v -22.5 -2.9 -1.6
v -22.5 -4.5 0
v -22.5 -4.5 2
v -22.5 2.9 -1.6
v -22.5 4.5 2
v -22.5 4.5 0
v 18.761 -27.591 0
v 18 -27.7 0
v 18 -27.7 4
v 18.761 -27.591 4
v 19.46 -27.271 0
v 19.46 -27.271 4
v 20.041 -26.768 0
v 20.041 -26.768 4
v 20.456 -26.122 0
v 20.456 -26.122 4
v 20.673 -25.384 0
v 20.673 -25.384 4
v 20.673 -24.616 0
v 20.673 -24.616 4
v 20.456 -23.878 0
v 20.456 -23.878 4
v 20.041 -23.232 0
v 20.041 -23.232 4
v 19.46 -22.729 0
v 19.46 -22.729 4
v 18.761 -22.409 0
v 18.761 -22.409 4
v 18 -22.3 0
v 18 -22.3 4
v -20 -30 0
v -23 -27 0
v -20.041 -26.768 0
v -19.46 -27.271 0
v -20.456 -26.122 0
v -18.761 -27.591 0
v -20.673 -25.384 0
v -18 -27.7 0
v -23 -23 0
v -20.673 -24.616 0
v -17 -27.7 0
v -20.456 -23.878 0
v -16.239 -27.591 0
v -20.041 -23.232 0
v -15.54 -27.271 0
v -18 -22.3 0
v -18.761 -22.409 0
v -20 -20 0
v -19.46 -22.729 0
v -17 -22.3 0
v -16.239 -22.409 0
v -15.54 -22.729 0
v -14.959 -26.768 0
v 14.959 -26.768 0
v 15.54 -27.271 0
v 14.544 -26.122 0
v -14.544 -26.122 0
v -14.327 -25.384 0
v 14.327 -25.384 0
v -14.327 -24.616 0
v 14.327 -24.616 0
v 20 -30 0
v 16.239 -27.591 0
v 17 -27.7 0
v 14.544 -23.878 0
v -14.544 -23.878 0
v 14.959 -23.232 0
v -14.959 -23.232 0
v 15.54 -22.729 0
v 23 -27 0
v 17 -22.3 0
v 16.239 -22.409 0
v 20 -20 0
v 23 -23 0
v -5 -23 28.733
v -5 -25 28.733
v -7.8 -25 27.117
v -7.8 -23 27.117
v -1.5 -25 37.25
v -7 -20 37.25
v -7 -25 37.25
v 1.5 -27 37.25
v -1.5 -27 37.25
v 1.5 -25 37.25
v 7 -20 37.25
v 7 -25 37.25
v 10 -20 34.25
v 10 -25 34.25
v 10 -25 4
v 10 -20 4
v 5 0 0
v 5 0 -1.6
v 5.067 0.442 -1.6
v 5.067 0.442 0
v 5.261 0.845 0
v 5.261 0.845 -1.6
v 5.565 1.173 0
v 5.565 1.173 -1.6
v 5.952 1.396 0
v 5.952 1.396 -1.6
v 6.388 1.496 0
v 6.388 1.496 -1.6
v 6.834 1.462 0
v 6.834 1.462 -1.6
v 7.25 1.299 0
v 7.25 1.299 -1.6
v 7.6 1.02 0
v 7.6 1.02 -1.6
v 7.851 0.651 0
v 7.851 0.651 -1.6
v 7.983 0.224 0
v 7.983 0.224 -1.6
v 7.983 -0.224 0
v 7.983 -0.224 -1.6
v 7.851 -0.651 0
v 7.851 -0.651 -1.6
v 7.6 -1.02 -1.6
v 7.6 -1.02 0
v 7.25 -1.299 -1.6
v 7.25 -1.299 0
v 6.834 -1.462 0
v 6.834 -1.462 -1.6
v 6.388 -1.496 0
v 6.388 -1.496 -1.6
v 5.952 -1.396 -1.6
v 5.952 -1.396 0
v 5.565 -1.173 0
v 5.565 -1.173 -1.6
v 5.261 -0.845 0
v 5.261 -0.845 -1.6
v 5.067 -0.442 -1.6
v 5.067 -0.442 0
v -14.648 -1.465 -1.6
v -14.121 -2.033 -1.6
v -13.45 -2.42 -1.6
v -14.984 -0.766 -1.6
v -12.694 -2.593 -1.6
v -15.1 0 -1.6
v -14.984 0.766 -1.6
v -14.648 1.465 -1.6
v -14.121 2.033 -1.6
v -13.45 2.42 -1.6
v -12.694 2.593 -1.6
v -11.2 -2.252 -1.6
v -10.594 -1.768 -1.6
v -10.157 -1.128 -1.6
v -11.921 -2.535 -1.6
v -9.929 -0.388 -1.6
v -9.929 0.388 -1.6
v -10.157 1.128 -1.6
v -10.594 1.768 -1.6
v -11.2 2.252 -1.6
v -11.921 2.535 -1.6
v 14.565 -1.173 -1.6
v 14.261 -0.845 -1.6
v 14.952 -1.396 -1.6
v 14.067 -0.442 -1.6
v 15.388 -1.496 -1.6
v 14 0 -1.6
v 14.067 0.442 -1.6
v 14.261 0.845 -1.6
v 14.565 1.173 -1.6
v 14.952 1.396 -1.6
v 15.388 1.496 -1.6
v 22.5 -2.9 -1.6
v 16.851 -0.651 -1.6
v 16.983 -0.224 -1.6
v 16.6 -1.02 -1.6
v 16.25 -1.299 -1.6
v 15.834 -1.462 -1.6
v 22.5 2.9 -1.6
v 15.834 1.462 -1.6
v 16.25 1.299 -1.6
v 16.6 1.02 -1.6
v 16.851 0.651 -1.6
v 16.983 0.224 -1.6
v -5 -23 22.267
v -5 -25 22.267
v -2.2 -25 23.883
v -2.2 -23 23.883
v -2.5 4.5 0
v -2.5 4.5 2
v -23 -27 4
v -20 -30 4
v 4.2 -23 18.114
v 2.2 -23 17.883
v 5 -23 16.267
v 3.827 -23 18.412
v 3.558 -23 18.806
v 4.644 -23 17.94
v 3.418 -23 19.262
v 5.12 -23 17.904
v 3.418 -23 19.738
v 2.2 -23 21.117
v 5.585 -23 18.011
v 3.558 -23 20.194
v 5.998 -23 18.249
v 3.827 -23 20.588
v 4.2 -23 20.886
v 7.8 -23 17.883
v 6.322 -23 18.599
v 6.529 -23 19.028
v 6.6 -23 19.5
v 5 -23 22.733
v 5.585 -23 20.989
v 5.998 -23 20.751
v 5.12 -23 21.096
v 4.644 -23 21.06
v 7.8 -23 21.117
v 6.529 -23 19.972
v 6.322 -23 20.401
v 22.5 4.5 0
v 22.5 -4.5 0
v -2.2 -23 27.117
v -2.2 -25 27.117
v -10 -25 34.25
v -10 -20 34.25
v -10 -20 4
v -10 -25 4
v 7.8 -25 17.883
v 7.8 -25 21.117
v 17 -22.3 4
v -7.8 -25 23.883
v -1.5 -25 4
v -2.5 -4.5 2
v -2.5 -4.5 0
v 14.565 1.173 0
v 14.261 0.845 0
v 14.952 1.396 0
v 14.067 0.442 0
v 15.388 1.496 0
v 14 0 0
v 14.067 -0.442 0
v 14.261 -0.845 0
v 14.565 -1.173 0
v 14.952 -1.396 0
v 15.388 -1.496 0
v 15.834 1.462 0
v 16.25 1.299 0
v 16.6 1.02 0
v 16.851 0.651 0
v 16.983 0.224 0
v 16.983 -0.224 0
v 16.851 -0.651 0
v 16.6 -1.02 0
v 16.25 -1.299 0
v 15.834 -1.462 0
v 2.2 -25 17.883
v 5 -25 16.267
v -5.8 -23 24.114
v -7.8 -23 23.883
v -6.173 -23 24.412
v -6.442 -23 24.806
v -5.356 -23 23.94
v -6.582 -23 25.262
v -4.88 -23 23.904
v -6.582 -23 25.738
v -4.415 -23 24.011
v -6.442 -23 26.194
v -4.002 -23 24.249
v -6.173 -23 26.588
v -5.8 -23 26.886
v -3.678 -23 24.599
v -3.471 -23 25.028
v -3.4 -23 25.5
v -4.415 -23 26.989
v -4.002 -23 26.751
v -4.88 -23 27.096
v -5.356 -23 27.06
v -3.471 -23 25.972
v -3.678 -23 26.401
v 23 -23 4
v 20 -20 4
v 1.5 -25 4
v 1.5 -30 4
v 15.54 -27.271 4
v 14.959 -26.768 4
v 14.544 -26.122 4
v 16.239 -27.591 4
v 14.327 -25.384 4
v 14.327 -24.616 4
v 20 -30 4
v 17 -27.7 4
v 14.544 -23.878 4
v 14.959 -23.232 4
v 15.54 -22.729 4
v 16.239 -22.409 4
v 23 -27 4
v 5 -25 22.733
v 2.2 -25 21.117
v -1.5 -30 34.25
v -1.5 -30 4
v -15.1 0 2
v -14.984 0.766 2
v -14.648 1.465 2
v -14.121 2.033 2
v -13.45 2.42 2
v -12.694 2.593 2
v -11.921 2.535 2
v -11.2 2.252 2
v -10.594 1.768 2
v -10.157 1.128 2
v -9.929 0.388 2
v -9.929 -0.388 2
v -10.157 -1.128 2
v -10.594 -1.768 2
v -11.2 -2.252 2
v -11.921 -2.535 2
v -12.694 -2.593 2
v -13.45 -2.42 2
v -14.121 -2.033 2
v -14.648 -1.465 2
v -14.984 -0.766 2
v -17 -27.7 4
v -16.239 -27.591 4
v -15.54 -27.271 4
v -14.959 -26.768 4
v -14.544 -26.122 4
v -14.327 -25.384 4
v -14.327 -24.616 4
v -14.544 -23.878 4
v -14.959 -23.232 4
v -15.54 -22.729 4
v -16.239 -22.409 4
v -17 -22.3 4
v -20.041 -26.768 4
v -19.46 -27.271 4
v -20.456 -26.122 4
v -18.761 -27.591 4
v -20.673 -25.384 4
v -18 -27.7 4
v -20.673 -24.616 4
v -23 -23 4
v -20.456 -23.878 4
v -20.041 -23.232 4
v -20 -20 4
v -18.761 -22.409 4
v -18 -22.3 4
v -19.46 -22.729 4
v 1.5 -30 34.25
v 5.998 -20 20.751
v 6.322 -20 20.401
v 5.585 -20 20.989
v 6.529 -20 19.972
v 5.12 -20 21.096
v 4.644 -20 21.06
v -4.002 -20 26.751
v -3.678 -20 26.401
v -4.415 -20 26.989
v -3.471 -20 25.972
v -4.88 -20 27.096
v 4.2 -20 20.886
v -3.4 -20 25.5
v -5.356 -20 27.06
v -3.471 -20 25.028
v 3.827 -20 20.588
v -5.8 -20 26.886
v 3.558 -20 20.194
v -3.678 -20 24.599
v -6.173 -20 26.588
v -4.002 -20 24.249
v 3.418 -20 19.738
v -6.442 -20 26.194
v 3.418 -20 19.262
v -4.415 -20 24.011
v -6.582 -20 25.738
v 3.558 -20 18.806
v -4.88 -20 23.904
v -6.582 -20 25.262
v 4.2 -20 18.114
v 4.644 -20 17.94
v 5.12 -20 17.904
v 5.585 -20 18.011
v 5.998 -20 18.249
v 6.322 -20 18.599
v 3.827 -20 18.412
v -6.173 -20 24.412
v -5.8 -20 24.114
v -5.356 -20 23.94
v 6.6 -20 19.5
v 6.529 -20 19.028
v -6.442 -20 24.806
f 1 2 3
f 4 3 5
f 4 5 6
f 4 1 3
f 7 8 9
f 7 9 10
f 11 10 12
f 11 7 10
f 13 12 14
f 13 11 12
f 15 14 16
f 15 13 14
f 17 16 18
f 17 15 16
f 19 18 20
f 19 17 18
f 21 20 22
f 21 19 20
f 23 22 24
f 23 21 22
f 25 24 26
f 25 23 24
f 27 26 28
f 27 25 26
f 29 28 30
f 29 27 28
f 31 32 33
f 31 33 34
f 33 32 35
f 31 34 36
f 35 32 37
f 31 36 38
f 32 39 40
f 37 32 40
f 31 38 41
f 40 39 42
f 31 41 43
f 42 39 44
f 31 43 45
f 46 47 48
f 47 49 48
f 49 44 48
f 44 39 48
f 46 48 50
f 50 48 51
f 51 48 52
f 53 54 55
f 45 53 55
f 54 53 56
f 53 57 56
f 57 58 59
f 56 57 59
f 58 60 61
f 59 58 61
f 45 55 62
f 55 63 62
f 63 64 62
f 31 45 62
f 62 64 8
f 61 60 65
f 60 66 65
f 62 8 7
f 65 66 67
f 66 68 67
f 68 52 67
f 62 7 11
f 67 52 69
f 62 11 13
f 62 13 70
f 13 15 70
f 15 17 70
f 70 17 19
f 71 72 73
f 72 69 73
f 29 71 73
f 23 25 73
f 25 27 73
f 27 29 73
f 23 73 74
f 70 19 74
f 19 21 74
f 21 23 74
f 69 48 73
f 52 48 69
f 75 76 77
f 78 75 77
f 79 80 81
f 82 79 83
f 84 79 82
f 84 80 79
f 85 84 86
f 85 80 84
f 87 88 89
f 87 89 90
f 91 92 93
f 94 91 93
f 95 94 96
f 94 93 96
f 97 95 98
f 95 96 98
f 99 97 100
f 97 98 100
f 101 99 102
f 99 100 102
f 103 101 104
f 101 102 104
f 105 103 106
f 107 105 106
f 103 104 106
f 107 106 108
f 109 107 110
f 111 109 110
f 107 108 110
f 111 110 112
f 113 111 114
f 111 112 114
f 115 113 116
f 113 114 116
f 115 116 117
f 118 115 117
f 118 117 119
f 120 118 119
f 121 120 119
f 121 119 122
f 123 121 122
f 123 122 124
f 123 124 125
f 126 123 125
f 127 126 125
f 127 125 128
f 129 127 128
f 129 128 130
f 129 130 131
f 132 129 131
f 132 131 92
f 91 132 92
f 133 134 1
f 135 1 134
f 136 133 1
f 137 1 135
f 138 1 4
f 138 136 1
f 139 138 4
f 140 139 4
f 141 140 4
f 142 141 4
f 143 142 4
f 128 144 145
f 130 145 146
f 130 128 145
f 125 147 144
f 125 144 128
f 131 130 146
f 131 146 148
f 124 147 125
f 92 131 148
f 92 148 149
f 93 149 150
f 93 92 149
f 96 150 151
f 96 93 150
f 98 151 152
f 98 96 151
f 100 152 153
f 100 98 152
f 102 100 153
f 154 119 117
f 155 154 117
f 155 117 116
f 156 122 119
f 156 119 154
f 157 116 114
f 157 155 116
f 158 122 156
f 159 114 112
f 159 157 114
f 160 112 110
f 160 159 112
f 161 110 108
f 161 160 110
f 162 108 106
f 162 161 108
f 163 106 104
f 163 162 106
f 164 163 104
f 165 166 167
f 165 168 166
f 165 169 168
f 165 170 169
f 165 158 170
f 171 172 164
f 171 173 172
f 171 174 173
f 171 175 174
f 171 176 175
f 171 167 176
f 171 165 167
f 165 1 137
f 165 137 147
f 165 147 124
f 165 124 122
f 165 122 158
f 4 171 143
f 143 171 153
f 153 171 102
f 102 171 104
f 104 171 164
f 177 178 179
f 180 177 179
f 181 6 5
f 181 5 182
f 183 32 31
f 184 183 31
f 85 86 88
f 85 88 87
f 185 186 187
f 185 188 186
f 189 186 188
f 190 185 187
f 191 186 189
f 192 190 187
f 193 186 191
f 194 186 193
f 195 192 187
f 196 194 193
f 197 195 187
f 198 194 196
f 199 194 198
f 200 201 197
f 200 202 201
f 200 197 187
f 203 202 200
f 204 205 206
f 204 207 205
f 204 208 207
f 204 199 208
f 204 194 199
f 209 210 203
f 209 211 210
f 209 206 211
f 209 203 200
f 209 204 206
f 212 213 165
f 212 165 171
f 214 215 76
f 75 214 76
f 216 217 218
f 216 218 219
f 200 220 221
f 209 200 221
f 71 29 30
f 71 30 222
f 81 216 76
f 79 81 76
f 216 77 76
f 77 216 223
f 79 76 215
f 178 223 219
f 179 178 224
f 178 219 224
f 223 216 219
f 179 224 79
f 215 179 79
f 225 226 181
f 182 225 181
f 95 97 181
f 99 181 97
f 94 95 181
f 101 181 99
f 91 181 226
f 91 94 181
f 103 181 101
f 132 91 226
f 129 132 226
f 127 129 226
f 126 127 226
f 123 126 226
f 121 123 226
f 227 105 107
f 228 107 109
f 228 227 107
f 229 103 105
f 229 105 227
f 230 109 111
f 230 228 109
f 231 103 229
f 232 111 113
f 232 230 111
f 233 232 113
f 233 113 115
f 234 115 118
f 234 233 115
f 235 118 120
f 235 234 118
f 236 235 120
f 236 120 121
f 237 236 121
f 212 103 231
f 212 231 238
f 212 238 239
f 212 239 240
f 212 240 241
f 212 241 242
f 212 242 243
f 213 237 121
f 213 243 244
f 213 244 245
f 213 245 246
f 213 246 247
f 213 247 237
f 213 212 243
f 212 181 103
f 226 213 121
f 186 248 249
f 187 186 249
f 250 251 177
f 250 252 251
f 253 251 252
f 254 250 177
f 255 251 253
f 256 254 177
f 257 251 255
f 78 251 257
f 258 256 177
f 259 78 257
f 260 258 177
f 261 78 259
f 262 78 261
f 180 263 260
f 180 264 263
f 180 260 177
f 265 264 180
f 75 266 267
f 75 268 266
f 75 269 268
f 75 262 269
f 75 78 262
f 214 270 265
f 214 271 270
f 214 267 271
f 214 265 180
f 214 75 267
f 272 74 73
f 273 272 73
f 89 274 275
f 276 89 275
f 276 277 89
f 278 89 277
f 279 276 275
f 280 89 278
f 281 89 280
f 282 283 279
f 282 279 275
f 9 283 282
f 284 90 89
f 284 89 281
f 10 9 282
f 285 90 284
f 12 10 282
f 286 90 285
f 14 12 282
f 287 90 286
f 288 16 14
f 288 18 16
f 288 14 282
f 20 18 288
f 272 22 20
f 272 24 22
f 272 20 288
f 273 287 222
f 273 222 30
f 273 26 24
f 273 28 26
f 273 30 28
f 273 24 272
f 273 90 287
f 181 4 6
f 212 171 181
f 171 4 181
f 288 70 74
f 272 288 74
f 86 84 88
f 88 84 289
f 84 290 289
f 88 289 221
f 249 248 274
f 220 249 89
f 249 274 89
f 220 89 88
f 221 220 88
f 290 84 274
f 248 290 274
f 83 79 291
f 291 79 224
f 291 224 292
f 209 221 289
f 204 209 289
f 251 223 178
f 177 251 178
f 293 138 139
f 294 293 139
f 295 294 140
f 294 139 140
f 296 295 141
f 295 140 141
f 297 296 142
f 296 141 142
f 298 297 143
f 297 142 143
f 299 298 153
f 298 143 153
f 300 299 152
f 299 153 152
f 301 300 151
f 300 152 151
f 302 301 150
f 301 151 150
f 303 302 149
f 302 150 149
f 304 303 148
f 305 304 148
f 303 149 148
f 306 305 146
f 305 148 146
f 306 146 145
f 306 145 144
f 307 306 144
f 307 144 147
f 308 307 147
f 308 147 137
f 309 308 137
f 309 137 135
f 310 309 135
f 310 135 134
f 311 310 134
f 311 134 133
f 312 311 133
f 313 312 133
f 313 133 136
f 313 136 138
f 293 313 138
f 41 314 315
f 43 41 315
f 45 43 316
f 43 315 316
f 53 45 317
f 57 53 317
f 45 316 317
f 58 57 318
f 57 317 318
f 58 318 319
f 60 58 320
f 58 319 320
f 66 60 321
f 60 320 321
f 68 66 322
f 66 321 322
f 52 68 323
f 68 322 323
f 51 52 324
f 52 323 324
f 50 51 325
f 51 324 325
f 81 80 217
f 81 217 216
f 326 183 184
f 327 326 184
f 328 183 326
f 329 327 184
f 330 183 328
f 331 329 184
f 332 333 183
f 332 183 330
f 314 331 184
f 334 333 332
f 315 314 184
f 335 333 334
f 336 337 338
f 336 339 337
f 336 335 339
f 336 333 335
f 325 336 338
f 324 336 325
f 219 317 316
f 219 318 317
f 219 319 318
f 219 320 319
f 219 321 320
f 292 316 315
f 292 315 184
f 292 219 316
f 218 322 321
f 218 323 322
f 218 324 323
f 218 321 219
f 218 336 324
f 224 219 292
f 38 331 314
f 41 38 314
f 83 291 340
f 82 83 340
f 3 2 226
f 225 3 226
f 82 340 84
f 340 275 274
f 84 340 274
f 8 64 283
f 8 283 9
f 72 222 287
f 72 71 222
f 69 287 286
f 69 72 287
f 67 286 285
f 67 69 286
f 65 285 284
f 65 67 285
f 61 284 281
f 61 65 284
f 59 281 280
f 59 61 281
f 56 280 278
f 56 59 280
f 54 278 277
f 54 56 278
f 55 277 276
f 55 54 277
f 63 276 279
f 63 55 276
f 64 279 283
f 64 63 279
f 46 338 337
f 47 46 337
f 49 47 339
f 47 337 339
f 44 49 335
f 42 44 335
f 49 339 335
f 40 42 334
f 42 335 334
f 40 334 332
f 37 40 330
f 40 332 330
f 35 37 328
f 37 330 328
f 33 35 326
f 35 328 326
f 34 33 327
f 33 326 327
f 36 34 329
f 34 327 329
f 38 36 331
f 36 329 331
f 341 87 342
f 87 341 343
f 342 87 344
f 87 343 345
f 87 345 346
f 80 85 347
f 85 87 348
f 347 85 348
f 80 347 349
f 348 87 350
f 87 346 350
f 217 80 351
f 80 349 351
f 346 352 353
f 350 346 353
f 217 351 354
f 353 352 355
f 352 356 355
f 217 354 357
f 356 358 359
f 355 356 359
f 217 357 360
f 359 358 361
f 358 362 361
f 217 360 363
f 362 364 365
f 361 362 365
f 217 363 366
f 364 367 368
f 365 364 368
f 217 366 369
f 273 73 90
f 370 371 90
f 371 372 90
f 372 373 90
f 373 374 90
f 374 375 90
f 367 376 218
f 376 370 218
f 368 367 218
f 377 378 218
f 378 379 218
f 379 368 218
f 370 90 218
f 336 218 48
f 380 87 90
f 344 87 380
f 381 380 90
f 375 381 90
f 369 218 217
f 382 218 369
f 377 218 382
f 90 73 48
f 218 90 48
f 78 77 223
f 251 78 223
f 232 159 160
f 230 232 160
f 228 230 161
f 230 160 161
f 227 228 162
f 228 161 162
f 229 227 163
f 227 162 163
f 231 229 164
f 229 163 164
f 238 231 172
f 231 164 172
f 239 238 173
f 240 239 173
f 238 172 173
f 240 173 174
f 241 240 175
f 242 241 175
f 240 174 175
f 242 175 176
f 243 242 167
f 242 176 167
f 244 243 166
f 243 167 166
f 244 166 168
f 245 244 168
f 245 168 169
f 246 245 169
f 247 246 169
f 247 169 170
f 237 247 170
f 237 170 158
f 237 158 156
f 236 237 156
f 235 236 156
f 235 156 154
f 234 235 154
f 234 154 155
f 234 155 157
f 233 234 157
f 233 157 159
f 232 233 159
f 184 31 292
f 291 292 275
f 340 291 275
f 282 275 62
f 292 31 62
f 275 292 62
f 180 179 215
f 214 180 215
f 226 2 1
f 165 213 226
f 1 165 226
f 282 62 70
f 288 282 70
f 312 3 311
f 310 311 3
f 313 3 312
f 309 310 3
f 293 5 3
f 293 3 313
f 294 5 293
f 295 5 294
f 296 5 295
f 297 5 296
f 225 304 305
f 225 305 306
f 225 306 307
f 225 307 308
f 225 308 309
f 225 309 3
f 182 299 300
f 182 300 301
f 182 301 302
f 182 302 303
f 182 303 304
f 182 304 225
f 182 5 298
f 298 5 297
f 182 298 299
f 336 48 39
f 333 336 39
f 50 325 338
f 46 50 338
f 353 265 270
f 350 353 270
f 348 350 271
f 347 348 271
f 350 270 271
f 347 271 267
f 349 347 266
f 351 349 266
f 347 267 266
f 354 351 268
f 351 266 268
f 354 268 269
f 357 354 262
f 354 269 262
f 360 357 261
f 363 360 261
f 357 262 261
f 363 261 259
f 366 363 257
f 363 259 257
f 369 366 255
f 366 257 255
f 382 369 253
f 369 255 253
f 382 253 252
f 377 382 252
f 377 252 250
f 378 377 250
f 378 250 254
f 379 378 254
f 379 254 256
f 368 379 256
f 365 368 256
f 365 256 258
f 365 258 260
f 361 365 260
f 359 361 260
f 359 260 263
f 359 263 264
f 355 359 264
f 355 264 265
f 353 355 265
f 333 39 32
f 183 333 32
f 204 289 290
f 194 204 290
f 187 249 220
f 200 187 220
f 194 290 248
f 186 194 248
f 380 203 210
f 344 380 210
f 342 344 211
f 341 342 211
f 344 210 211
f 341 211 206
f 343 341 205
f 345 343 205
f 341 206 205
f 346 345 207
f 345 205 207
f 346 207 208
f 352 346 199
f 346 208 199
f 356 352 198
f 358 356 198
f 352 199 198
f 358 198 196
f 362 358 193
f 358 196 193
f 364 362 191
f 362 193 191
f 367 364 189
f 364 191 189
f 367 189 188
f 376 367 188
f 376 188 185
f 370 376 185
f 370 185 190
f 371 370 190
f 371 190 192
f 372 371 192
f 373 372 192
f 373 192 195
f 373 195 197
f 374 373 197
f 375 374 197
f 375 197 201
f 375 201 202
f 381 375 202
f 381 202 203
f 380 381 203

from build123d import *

# Parameters (mm, degrees)
F1_DEPTH        = 3
F3_DEPTH        = 34.25
F4_SIZE         = 3
F6_D            = 3.2
F8_DEPTH        = 3.001
F10_DEPTH       = 2
F13_DEPTH       = 22.5
F14_W           = 20
F14_H           = 9
F15_DEPTH       = 2
F17_D           = 5.2
F17_CBORE_D     = 10
F17_CBORE_DEPTH = 0
F19_D           = 3
F20_DEPTH       = 1


with BuildPart() as f1:
    # F0 (on Top) → F1 (new body)
    with BuildSketch(Plane.XY):
        Polygon((20, 5), (0, 5), (-20, 5), (-23, 2), (-23, 0), (-23, -2), (-20, -5), (0, -5), (20, -5), (23, -2), (23, 0), (23, 2), align=None)
    extrude(amount=F1_DEPTH)

    # F2 (on face) → F3 (join)
    with BuildSketch(Plane.XY.offset(3)):
        Polygon((10, 5), (-10, 5), (-10, 0), (-1.5, 0), (-1.5, -5), (1.5, -5), (1.5, 0), (10, 0), align=None)
    extrude(amount=F3_DEPTH)

    # F4
    f4_edges = [f1.edges().sort_by_distance(p)[0] for p in [
        (10, 2.5, 37.25),
        (-10, 2.5, 37.25),
        (0, -5, 37.25),
    ]]
    chamfer(f4_edges, length=F4_SIZE)

    # F6 (through all)
    with Locations(Plane(origin=(0, 5, 0), x_dir=(-1, 0, 0), z_dir=(0, 1, 0))):
        with Locations((5, 25.5), (-5, 19.5)):
            Hole(F6_D / 2)

    # F7 (on face) → F8 (cut, through all)
    with BuildSketch(Plane.XY.offset(3)):
        with BuildLine():
            ThreePointArc((17, 2.7), (14.3, 0), (17, -2.7))
            Line((17, -2.7), (18, -2.7))
            ThreePointArc((18, -2.7), (20.7, 0), (18, 2.7))
            Line((18, 2.7), (17, 2.7))
        make_face()
        with BuildLine():
            ThreePointArc((-17, -2.7), (-14.3, 0), (-17, 2.7))
            Line((-17, 2.7), (-18, 2.7))
            ThreePointArc((-18, 2.7), (-20.7, 0), (-18, -2.7))
            Line((-18, -2.7), (-17, -2.7))
        make_face()
    extrude(amount=-F8_DEPTH, mode=Mode.SUBTRACT)

    # F9 (on face) → F10 (cut)
    with BuildSketch(Plane.XZ):
        Polygon((7.8, 17.8834192463), (7.8, 21.1165807537), (5, 22.7331615075), (2.2, 21.1165807537), (2.2, 17.8834192463), (5, 16.2668384925), align=None)
        Polygon((-2.2, 23.8834192463), (-2.2, 27.1165807537), (-5, 28.7331615075), (-7.8, 27.1165807537), (-7.8, 23.8834192463), (-5, 22.2668384925), align=None)
    extrude(amount=-F10_DEPTH, mode=Mode.SUBTRACT)


with BuildPart() as f1_1:
    # F11: moved
    add(f1.part.moved(Location((0, -25, 0))))

    # F20 (add): faces of the model
    f20_faces = [f1_1.faces().sort_by_distance(p)[0] for p in [
        (12.5452222466, -25.7858856299, 3),
        (-12.5452222466, -25.7858856299, 3),
    ]]
    extrude(f20_faces, amount=F20_DEPTH)


with BuildPart() as f13:
    # F12 (on Right) → F13 (new body, symmetric)
    with BuildSketch(Plane.YZ):
        Polygon((4.5, 0), (0, 0), (-4.5, 0), (-2.9, -1.6), (2.9, -1.6), align=None)
    extrude(amount=F13_DEPTH, both=True)

    # F14 (on face) → F15 (join)
    with BuildSketch(Plane.XY):
        with Locations((-12.5, 0)):
            Rectangle(F14_W, F14_H)
    extrude(amount=F15_DEPTH)

    # F17 (through all)
    with Locations(Plane.XY.offset(2)):
        with Locations((-12.5, 0)):
            CounterBoreHole(F17_D / 2, F17_CBORE_D / 2, F17_CBORE_DEPTH)

    # F19 (through all)
    with Locations(Plane.XY):
        with Locations((6.5, 0), (15.5, 0)):
            Hole(F19_D / 2)


solid = Compound([f1_1.part, f13.part])
